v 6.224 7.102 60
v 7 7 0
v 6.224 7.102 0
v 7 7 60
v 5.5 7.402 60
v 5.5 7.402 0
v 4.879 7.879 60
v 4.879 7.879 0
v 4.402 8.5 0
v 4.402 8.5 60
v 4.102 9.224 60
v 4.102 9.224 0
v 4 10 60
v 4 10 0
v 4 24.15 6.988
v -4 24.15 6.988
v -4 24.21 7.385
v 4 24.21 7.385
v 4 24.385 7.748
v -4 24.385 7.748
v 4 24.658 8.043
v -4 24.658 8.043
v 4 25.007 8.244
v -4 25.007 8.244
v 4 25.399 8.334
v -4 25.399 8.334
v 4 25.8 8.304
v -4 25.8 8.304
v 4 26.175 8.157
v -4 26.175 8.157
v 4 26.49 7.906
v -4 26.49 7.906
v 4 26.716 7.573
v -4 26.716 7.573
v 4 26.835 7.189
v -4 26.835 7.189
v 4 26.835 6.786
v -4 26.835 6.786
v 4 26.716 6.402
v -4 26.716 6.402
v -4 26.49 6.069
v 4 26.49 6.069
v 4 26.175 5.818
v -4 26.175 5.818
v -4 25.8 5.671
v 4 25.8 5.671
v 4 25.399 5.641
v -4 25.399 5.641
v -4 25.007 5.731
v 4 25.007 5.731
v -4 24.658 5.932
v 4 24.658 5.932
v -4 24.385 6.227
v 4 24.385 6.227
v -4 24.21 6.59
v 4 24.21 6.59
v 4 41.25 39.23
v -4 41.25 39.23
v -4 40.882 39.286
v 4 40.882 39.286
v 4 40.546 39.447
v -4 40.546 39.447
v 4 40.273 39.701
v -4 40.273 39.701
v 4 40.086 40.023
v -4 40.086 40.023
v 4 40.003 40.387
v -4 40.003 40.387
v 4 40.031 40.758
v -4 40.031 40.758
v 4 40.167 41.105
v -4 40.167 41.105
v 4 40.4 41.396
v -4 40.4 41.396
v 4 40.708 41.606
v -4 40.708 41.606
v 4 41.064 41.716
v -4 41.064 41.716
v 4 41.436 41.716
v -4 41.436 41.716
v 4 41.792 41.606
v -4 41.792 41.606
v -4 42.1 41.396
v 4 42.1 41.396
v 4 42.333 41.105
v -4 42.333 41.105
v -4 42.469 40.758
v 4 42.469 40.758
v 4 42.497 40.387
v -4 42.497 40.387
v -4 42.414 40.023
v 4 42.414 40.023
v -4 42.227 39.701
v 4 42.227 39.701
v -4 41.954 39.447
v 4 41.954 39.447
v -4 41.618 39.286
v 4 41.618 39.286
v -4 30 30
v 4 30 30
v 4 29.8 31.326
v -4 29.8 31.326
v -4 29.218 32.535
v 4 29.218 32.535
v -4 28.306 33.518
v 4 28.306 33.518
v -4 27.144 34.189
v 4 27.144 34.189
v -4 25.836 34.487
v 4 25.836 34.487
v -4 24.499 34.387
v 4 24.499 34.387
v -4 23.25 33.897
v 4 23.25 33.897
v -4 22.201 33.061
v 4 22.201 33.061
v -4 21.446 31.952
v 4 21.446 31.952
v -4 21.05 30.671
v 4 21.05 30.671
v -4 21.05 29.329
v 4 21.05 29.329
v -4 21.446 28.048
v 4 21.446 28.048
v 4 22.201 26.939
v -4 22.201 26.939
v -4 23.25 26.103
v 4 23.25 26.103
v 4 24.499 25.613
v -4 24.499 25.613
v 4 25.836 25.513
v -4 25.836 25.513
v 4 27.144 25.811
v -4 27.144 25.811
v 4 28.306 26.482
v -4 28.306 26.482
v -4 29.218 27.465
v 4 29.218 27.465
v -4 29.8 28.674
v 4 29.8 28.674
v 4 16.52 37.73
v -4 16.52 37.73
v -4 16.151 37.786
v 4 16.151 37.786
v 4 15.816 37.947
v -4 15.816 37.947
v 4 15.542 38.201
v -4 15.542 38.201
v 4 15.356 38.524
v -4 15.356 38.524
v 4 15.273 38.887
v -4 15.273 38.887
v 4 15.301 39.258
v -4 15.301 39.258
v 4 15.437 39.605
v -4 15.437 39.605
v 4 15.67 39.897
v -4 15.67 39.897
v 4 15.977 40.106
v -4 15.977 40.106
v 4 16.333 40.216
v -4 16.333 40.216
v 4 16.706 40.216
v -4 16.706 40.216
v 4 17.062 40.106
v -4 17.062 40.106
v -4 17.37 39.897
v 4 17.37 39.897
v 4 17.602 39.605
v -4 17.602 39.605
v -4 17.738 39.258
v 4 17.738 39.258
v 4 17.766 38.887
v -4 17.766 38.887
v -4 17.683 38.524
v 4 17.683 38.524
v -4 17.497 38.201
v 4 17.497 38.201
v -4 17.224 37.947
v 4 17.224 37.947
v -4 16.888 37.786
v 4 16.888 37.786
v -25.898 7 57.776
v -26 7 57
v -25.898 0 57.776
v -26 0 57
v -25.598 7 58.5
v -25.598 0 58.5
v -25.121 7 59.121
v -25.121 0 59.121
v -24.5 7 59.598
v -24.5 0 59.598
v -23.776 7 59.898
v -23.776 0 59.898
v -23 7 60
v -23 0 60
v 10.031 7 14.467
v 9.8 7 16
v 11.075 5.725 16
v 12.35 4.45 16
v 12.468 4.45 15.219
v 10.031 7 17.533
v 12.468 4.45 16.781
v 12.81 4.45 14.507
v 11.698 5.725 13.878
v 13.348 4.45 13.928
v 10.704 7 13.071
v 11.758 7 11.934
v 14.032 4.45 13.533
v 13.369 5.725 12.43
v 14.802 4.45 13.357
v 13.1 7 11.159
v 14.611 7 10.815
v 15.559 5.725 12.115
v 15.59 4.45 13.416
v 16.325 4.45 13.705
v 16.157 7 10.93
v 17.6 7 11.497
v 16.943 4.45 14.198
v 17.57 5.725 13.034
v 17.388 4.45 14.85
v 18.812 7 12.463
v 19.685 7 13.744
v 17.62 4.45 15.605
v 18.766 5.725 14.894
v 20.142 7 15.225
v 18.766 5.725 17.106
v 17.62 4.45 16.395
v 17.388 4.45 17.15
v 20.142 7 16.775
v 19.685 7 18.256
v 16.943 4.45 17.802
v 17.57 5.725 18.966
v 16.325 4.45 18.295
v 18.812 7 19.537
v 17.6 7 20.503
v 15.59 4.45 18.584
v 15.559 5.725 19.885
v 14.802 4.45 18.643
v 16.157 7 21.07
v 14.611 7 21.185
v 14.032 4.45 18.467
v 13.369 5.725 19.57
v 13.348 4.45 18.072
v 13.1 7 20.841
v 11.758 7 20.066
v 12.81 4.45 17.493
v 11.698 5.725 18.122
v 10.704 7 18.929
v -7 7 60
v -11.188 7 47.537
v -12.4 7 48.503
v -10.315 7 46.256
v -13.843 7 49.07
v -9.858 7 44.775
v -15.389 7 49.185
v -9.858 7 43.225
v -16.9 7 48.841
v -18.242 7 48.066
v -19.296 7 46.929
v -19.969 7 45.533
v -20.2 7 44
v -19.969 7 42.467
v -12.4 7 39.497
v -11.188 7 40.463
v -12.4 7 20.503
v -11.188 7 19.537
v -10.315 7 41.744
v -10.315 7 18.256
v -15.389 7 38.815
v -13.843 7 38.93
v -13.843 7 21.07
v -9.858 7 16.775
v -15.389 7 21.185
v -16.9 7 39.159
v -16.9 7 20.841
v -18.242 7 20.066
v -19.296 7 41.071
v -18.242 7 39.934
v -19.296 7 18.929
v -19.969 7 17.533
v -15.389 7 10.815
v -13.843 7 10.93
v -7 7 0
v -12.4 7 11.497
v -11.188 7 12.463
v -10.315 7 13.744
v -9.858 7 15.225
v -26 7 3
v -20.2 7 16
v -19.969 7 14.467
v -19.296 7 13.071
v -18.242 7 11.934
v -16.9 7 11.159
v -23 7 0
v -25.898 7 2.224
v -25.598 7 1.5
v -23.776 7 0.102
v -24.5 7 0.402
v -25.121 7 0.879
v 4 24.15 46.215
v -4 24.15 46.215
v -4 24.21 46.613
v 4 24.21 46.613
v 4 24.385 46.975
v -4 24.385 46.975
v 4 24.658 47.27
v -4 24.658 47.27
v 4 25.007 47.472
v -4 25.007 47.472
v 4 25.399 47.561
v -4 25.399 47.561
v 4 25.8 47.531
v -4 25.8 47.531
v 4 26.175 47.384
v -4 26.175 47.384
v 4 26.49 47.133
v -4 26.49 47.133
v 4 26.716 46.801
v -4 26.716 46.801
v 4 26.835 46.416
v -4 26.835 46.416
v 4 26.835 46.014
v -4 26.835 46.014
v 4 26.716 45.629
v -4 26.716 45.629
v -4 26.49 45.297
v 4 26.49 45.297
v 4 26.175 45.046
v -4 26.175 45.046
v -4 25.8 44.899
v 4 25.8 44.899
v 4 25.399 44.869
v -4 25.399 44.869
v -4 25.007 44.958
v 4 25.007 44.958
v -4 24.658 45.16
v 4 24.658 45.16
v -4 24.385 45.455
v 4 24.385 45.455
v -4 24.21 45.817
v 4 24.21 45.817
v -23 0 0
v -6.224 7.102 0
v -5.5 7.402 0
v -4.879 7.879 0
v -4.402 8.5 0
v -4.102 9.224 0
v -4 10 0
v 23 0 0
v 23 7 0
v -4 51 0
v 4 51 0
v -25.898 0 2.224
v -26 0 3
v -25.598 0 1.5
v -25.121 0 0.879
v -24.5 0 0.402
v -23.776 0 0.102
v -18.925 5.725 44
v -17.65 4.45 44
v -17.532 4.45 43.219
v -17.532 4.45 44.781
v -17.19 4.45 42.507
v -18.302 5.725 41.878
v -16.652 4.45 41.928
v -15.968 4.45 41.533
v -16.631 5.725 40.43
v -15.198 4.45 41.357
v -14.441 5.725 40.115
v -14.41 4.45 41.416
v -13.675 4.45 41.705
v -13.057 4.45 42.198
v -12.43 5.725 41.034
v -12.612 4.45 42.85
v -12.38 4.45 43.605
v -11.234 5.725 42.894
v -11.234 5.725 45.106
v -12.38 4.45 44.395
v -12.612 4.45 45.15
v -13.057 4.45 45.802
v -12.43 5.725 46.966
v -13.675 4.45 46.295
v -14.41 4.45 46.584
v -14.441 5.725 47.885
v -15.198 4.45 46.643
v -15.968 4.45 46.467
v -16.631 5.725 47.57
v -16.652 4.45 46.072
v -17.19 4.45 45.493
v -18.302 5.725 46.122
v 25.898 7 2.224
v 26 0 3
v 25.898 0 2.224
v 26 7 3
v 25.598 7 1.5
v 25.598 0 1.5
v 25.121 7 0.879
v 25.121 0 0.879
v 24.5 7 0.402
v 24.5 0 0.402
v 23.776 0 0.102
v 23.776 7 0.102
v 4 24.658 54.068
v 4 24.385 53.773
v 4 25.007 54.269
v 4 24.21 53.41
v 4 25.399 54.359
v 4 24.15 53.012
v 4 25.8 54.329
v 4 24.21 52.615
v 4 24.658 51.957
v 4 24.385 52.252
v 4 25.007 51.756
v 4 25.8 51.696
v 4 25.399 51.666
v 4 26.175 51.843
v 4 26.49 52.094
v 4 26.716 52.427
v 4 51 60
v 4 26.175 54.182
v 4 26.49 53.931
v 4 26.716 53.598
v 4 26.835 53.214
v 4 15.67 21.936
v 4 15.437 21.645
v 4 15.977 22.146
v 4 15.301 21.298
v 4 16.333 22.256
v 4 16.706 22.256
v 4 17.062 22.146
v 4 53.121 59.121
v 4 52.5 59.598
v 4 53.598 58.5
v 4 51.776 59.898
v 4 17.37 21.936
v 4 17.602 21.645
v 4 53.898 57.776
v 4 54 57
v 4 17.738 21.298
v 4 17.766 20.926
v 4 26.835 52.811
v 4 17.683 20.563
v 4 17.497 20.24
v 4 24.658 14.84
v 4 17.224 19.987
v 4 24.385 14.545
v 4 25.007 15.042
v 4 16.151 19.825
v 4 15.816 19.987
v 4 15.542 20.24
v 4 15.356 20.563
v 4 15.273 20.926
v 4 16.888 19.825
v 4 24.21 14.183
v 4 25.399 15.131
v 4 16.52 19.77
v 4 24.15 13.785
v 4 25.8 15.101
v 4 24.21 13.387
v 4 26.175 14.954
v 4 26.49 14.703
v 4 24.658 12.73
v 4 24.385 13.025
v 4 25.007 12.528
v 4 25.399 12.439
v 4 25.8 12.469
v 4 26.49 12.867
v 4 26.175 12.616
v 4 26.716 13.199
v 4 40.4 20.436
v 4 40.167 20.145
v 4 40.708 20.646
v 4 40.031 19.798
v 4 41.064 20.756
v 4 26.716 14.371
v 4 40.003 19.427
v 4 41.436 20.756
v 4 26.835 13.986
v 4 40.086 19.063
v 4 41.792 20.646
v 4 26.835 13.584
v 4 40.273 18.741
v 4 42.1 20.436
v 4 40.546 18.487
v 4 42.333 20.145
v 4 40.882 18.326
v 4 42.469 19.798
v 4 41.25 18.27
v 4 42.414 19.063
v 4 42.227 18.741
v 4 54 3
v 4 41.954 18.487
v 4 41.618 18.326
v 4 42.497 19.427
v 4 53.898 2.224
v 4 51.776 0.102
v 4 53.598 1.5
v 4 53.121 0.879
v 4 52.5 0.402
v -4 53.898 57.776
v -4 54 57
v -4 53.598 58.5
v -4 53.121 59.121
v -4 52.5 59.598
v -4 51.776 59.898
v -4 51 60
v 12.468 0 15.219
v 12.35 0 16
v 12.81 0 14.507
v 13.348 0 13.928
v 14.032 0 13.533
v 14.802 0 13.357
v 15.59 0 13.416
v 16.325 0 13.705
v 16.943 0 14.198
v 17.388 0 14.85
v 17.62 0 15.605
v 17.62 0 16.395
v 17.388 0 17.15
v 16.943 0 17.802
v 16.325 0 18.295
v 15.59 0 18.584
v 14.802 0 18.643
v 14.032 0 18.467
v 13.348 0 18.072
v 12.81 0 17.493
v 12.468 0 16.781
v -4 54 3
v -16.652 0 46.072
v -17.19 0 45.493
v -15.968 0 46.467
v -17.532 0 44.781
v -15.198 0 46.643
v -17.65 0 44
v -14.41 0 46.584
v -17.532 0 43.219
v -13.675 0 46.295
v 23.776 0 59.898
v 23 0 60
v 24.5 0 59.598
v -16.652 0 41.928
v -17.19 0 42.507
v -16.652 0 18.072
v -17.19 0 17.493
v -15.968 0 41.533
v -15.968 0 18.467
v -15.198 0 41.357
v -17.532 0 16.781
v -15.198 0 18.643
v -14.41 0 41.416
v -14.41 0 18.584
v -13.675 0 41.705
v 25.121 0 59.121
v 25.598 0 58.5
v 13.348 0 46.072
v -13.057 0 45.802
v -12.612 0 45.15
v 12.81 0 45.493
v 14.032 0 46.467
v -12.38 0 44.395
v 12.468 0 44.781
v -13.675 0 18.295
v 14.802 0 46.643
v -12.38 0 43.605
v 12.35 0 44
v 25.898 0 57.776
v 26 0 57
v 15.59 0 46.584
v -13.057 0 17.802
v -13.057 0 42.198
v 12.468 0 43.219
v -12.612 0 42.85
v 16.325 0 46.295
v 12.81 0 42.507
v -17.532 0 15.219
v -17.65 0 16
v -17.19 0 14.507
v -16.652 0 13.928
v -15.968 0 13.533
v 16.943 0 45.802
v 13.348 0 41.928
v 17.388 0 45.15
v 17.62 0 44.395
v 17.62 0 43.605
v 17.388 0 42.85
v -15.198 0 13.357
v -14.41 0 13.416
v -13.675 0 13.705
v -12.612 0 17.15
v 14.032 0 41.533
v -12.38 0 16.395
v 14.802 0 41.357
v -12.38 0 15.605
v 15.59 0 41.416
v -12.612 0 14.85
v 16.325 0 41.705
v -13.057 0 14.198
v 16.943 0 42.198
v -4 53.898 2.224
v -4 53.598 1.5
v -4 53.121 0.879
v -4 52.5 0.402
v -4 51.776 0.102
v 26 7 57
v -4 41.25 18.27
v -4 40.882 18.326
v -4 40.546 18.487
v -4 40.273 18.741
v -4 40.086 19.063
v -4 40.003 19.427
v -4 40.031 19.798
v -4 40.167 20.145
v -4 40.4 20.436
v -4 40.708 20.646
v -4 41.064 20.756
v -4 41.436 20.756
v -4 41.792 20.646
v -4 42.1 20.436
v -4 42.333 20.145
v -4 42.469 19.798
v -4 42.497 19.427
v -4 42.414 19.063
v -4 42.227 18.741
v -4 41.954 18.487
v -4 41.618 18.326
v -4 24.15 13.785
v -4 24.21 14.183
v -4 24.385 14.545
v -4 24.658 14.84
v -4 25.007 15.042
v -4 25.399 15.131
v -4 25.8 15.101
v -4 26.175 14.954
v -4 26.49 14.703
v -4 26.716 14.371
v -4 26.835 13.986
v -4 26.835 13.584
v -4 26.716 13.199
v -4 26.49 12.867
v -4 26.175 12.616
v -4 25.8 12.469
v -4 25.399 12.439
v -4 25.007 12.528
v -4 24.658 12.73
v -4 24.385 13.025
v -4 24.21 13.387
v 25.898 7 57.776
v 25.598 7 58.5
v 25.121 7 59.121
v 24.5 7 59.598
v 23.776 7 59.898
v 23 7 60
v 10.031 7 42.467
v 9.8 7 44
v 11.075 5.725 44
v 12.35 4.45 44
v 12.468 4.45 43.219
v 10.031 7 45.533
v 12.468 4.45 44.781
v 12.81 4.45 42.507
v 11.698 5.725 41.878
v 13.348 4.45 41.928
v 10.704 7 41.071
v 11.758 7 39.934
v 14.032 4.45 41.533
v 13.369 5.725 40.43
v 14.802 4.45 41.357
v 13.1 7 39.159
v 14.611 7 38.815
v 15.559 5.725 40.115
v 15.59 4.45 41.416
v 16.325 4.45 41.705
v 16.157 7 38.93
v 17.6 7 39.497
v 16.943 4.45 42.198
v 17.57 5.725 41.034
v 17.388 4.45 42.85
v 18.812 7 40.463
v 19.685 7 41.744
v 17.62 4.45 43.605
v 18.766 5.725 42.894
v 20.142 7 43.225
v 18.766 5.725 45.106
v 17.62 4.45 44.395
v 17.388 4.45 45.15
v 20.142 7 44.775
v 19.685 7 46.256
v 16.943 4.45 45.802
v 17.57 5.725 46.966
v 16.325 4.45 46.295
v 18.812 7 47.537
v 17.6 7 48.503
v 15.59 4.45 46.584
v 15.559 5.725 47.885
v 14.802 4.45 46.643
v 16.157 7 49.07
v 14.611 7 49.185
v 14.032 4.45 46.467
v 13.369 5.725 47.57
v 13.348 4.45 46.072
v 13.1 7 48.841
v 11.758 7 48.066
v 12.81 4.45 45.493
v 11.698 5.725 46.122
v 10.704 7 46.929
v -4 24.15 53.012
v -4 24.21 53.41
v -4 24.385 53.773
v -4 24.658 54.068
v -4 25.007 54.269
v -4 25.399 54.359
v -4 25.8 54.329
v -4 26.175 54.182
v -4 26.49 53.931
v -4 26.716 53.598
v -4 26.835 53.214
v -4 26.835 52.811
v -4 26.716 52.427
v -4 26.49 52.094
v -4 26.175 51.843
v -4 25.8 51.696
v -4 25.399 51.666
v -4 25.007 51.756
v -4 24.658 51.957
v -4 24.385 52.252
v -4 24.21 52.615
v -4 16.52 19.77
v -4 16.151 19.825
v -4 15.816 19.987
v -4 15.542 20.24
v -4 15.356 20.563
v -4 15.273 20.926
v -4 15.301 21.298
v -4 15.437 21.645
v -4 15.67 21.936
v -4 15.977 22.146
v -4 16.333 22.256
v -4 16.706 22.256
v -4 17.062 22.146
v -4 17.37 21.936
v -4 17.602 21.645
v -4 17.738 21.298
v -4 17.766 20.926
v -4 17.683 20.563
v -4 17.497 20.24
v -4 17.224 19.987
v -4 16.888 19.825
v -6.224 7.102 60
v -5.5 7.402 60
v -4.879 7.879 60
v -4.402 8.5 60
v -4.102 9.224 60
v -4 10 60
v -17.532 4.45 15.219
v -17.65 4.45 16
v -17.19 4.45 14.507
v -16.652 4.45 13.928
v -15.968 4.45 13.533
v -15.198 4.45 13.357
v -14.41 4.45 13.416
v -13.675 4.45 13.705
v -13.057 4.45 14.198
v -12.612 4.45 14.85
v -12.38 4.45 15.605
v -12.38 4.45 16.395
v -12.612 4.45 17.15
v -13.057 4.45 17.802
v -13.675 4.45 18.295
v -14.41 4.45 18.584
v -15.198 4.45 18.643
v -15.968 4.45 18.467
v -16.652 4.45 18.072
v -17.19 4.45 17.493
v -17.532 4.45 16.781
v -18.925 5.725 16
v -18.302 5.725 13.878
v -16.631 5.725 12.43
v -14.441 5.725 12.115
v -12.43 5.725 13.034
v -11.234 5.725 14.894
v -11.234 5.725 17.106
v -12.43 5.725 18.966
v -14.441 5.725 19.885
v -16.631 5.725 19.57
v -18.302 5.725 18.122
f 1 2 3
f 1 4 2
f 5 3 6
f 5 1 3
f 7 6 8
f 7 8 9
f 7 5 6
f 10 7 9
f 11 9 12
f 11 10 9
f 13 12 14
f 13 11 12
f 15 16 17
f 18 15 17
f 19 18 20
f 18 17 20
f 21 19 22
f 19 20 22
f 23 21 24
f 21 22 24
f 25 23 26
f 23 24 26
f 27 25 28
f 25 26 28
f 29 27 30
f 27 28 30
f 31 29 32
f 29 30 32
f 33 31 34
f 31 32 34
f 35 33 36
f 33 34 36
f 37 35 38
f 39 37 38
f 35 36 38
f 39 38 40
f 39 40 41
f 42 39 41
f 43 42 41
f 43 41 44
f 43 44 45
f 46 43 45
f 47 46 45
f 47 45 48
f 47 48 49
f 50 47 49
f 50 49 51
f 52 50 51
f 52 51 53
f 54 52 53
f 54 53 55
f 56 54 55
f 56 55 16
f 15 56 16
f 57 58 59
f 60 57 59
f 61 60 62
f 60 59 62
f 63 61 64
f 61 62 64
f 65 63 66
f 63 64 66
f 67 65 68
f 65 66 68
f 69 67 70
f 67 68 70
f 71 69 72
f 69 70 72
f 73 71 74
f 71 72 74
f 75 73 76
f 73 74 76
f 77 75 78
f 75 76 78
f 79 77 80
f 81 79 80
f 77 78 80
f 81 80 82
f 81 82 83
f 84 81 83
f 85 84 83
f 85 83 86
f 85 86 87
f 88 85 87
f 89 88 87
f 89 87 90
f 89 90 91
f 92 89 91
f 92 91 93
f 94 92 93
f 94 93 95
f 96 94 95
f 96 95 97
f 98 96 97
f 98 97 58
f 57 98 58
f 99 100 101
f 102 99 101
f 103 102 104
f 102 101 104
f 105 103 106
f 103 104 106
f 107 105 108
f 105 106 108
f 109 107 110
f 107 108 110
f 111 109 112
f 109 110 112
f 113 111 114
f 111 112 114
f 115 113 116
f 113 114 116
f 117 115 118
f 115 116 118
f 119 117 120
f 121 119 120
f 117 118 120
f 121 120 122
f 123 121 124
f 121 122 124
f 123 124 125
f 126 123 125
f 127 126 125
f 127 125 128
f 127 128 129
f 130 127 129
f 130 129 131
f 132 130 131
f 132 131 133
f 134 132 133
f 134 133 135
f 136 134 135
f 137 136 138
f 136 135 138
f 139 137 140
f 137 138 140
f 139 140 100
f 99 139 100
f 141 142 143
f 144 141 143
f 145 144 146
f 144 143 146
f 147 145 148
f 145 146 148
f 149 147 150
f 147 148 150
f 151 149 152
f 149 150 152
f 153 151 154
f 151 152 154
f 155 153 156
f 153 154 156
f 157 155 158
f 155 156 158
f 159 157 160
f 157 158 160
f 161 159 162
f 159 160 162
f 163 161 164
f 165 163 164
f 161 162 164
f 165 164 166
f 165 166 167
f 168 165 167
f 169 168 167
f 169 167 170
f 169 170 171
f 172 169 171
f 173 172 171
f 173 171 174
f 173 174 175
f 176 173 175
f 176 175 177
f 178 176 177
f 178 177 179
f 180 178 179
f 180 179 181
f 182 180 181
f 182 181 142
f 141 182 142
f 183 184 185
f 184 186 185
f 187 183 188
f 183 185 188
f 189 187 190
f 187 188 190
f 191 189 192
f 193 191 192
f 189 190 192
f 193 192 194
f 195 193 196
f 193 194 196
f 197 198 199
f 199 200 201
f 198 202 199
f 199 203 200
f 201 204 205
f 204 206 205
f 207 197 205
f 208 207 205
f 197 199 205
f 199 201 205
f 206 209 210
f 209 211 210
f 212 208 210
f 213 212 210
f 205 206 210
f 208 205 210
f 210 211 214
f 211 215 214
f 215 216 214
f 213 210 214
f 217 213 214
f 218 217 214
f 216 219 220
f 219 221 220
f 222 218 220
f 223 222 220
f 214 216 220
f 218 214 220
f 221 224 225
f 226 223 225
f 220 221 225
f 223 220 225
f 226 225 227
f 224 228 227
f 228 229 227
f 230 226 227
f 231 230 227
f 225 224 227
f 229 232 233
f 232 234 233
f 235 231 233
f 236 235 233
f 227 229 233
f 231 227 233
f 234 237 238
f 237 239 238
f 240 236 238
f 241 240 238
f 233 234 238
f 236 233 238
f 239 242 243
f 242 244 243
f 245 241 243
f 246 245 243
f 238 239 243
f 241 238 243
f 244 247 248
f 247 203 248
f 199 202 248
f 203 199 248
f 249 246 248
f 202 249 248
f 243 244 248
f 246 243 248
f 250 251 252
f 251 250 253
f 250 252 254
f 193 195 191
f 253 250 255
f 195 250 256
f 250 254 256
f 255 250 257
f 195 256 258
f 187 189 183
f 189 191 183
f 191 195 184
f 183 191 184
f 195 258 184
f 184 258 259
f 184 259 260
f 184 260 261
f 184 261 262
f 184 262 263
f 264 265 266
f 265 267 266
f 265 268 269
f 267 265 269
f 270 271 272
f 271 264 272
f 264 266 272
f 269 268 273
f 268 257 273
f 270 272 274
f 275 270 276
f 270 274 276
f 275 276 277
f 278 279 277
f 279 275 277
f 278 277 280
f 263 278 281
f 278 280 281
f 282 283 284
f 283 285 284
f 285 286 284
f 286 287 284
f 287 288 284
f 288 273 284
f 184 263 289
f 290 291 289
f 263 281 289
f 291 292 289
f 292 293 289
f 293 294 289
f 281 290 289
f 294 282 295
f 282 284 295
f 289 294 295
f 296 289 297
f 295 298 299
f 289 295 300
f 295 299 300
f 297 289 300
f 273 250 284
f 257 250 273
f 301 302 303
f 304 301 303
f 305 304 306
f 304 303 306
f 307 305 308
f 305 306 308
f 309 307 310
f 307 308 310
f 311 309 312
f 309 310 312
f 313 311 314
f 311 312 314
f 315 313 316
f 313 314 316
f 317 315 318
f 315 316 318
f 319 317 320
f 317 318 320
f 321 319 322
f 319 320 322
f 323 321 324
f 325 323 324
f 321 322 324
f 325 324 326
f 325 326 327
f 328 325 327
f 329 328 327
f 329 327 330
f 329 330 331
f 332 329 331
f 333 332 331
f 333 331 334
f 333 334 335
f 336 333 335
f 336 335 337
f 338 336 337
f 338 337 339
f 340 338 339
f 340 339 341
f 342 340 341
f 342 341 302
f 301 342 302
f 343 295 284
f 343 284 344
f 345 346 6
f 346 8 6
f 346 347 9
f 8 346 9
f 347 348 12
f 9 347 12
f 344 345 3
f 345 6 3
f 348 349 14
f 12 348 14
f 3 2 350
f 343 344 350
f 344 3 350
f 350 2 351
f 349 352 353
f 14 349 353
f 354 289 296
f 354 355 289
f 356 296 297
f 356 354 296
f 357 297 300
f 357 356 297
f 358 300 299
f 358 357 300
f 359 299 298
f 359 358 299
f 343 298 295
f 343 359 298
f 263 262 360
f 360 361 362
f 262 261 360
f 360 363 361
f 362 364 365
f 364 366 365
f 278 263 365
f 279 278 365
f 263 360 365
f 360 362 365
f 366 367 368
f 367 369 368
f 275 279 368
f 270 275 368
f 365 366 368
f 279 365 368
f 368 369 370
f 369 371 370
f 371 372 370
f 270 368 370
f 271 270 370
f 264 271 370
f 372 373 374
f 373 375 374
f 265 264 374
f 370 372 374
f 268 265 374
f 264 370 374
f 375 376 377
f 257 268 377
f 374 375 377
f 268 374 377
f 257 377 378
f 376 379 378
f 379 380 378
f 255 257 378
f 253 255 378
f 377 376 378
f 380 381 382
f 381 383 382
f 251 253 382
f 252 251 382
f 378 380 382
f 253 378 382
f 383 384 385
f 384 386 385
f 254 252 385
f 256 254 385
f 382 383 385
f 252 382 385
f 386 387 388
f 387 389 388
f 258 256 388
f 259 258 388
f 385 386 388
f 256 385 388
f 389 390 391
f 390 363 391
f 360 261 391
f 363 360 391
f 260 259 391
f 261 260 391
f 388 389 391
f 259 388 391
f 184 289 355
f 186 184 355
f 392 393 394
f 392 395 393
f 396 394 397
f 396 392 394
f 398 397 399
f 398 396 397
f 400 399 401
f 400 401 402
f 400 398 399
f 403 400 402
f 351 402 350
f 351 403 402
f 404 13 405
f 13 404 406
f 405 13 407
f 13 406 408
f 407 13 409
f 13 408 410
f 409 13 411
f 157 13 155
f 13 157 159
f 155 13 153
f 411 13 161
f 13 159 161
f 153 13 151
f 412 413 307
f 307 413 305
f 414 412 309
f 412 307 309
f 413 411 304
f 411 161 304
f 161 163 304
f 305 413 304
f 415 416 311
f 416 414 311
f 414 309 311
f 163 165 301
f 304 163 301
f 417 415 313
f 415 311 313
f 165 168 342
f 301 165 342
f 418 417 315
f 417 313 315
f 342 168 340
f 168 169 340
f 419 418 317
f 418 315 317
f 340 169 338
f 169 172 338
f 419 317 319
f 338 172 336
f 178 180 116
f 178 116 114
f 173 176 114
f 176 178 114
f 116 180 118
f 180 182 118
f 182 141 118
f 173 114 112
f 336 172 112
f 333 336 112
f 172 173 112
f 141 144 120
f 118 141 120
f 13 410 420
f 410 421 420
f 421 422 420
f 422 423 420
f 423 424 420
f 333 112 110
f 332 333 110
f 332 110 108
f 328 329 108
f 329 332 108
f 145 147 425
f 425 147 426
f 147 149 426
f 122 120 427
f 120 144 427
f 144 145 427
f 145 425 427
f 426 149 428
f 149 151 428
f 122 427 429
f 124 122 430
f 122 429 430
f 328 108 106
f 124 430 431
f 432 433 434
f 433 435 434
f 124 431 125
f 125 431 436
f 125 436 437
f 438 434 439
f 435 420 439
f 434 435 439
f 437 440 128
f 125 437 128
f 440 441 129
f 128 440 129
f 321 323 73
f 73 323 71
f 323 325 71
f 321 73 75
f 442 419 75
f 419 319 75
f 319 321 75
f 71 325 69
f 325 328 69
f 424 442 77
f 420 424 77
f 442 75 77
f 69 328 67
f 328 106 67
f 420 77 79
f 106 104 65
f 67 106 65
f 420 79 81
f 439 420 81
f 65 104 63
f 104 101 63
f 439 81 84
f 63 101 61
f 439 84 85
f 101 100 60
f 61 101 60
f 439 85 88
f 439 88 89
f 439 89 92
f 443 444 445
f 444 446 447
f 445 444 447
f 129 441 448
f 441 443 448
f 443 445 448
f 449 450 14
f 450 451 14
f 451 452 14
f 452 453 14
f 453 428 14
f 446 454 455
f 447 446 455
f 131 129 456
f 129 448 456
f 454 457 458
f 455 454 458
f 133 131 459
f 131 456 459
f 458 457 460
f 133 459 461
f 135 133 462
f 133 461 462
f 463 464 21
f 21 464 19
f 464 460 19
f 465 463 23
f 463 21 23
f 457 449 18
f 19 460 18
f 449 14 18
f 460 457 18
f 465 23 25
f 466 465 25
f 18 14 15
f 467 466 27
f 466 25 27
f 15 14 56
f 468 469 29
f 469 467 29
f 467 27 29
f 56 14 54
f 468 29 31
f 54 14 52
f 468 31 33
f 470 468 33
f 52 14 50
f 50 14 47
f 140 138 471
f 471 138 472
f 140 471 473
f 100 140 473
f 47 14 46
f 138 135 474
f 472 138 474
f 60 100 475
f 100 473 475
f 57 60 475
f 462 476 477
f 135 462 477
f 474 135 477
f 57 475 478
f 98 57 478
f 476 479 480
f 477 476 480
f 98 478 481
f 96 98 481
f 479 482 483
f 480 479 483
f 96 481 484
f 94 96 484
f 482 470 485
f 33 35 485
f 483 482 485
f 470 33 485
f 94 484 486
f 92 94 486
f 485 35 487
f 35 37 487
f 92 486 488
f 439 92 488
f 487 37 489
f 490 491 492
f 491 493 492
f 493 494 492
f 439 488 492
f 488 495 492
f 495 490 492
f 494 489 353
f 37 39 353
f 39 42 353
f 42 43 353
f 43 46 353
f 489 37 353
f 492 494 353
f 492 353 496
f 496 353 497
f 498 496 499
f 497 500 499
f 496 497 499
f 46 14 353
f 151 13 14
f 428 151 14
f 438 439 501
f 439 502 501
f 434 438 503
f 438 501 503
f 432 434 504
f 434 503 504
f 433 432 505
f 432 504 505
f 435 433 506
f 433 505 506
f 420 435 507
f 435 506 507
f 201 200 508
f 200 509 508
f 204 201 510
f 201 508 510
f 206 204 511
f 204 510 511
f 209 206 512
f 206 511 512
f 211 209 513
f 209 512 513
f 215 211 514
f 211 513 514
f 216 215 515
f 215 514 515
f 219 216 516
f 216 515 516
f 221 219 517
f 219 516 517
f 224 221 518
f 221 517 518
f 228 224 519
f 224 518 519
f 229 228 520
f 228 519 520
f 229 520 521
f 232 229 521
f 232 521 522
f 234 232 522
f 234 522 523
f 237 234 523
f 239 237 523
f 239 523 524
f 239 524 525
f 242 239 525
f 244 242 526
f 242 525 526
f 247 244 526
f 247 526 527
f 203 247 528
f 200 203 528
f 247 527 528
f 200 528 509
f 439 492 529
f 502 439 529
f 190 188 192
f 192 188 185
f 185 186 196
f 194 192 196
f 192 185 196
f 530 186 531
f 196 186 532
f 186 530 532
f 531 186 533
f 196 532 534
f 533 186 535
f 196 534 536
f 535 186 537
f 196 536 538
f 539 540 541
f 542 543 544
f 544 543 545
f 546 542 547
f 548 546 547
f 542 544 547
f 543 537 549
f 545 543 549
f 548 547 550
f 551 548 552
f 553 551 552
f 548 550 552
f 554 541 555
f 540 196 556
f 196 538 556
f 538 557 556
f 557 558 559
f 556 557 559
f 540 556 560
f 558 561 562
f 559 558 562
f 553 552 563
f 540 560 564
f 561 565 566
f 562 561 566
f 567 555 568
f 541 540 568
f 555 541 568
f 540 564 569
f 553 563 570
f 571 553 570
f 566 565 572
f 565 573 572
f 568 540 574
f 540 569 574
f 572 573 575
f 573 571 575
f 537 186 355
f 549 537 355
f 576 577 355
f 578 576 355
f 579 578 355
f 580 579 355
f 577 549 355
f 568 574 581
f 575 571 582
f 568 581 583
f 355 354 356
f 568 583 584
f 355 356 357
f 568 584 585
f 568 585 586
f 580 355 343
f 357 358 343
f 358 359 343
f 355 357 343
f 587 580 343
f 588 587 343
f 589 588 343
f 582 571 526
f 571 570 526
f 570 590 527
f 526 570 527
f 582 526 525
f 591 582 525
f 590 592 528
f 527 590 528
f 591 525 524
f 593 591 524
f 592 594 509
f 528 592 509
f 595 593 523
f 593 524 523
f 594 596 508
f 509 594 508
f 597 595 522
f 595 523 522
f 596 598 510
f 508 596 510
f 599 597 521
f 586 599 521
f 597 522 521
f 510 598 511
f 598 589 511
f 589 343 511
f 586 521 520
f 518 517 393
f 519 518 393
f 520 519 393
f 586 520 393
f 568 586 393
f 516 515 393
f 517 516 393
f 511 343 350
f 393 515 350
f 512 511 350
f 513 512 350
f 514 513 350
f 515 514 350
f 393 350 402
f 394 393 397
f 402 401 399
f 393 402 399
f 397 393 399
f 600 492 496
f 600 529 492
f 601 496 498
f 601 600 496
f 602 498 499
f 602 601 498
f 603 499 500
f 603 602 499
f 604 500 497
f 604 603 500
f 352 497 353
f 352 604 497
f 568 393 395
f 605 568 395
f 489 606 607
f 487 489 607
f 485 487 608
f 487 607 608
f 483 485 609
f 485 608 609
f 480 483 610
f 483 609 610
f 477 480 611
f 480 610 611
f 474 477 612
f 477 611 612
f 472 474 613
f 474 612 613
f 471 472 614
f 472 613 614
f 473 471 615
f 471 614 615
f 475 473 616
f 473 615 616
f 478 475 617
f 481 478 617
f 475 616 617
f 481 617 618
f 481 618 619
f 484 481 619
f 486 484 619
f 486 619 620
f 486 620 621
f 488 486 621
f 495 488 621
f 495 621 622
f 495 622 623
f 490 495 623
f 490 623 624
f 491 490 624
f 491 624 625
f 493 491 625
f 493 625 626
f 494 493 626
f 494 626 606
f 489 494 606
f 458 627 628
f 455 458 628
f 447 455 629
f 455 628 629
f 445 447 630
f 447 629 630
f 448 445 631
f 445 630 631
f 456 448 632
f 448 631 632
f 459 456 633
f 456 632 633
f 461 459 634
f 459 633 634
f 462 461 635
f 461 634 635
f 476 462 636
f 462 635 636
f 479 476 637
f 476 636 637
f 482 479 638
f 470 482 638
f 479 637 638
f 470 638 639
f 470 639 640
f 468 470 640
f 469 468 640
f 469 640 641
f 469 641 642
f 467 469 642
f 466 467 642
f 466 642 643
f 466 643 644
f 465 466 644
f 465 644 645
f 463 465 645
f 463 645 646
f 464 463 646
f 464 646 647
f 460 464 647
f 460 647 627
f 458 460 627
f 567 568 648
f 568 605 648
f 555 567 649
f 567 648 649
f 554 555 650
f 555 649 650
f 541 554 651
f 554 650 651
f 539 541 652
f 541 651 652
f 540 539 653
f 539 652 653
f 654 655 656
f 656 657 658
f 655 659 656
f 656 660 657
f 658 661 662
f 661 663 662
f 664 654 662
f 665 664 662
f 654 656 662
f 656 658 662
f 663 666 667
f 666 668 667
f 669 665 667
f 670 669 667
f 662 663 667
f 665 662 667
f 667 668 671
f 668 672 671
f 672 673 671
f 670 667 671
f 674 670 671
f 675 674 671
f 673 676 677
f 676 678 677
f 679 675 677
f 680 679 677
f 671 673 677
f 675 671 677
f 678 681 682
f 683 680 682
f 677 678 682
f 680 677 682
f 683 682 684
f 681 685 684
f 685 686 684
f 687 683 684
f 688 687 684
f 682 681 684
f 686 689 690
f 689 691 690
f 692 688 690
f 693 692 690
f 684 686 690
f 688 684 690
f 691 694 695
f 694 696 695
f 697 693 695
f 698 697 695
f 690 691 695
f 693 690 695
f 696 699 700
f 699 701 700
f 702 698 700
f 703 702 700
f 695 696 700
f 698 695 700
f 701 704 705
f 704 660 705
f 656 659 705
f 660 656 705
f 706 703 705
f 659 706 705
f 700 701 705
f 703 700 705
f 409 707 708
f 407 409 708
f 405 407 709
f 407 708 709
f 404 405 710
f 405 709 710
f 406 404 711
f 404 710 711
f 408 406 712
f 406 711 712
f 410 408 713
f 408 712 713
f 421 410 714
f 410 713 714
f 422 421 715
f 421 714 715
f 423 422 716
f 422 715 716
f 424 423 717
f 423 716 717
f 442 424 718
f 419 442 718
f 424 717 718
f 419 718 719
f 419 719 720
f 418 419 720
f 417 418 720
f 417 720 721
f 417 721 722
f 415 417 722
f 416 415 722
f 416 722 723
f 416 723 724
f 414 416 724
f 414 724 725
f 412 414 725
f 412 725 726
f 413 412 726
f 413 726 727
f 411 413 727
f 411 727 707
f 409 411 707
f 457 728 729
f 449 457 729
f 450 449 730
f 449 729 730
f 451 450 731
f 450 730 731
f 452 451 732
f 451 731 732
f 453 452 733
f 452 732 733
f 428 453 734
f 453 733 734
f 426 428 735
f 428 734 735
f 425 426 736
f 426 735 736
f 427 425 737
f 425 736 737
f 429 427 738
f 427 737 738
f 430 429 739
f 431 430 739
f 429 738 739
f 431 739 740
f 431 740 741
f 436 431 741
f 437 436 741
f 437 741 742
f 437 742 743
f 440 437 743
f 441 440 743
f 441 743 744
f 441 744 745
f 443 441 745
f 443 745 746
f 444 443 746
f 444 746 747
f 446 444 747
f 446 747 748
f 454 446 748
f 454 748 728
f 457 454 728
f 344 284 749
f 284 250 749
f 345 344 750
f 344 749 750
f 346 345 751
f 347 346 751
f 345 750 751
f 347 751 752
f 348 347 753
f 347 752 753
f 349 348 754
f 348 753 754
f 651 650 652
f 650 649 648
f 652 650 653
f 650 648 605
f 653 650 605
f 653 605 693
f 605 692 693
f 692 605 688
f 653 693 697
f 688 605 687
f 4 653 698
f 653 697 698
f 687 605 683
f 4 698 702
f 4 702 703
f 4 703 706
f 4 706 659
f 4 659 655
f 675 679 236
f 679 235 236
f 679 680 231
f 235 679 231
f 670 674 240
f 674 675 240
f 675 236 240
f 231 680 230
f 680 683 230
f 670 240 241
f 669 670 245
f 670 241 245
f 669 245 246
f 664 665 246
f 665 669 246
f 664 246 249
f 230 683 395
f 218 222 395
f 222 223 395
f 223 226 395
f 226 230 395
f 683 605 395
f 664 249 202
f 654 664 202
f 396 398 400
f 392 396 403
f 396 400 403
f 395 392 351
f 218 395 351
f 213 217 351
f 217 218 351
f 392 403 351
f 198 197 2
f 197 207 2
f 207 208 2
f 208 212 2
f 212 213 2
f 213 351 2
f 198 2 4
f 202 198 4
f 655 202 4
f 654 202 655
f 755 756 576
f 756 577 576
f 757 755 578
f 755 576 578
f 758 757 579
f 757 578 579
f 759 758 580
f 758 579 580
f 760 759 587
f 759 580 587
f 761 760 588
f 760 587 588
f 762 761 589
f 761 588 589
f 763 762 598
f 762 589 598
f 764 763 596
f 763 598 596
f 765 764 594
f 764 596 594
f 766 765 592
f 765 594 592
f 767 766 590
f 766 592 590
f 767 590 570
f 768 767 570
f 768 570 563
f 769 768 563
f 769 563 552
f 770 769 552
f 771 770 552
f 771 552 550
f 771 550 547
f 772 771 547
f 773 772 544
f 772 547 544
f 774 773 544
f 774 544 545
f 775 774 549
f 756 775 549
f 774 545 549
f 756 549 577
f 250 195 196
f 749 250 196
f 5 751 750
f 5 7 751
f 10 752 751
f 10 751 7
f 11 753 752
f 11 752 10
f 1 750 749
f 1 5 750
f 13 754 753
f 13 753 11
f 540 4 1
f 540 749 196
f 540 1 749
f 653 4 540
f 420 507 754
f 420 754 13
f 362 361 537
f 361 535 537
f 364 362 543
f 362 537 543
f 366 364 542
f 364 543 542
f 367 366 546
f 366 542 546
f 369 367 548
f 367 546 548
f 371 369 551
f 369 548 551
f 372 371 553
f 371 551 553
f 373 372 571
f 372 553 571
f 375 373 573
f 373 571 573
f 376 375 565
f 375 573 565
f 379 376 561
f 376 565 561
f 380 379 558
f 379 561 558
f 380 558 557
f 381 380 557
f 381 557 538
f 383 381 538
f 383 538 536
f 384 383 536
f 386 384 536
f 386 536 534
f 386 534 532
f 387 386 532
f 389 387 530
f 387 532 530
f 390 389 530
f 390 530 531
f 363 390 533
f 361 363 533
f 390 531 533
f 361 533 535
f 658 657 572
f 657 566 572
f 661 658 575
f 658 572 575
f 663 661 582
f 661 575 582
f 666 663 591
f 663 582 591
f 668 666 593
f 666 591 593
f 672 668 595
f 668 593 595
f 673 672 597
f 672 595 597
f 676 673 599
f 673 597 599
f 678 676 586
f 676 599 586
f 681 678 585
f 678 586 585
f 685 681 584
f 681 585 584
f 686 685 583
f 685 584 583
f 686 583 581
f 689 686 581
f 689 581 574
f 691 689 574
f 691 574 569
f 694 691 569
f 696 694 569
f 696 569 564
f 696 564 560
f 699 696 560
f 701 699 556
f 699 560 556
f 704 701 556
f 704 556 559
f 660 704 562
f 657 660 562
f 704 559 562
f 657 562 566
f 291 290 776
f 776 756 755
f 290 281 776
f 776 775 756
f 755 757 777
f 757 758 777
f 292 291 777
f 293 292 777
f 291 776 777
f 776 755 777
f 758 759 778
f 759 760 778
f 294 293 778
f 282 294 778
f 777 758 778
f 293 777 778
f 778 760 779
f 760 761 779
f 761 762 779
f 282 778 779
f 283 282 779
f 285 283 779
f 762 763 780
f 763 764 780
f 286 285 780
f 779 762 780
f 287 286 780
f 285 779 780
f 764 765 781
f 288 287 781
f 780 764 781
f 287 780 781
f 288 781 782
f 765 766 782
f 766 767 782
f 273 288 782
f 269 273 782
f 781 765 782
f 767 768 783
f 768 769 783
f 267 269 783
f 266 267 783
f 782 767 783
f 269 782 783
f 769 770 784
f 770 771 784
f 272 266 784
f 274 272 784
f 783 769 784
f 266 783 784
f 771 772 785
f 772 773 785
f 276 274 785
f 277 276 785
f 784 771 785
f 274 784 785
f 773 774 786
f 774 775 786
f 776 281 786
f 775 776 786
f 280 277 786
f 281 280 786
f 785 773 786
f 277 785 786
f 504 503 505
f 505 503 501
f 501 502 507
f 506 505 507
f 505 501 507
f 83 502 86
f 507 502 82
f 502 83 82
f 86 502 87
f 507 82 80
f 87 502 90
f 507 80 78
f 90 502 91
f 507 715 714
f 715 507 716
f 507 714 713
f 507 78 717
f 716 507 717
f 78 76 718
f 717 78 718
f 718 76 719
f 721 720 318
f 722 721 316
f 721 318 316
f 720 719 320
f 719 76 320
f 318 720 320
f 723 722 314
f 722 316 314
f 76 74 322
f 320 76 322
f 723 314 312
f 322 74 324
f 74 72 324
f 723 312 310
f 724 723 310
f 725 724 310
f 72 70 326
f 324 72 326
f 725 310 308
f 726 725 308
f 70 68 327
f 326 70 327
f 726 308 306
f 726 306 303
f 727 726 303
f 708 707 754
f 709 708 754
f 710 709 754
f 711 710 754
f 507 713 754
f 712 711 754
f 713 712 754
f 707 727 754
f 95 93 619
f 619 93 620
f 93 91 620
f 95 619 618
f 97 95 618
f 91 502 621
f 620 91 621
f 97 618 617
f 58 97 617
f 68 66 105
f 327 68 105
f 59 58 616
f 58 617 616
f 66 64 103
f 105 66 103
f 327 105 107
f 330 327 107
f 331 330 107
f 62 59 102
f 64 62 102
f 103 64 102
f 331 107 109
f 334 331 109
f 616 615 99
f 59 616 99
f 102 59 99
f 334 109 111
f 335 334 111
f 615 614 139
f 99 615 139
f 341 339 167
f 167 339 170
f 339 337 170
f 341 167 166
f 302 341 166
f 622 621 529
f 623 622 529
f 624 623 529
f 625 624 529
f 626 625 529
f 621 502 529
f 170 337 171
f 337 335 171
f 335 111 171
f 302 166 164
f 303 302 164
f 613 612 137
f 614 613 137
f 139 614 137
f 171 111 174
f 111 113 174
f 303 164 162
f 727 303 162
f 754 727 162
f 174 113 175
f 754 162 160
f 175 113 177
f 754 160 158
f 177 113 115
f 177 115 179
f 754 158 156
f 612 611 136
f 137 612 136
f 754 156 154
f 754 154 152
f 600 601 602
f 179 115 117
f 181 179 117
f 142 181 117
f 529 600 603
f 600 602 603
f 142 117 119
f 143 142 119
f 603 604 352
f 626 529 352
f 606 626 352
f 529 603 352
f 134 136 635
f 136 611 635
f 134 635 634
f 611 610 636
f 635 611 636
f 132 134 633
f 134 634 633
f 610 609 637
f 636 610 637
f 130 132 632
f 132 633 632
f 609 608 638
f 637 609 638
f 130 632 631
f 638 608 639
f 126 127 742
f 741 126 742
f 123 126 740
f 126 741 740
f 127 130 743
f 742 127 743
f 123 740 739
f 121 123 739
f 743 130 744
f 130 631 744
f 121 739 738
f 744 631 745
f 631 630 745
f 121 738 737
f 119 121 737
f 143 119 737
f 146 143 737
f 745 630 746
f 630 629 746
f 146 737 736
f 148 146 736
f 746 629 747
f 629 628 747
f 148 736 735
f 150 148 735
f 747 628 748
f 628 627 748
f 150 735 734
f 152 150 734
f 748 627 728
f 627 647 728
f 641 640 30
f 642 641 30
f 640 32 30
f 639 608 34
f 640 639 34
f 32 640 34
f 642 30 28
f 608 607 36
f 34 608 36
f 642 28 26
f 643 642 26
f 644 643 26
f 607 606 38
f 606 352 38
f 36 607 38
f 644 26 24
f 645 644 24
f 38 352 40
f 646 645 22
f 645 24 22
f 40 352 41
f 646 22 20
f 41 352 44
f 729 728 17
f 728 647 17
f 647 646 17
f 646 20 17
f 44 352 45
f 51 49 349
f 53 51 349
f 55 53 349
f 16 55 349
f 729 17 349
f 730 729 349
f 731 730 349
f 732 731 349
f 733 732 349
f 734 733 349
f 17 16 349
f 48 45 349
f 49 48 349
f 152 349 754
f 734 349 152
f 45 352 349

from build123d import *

# Parameters (mm, degrees)
BOSS_EXTRUDE1_DEPTH                                  = 60
FILLET1_R                                            = 3
SKETCH2_R                                            = 4.5
CUT_EXTRUDE1_DEPTH                                   = 8
TAP_DRILL_FOR_M3_TAP1_D                              = 2.7
TAP_DRILL_FOR_M3_TAP2_D                              = 2.5
CSK_FOR_M5_COUNTERSUNK_RAISED_HEAD_SCREW_D           = 5.3
CSK_FOR_M5_COUNTERSUNK_RAISED_HEAD_SCREW_CSINK_D     = 10.4
CSK_FOR_M5_COUNTERSUNK_RAISED_HEAD_SCREW_CSINK_ANGLE = 90


with BuildPart() as part:
    # Sketch1 → Boss-Extrude1 (new body)
    with BuildSketch(Plane.XY):
        Polygon((-4, 7), (-26, 7), (-26, 0), (26, 0), (26, 7), (4, 7), (4, 54), (-4, 54), align=None)
    extrude(amount=BOSS_EXTRUDE1_DEPTH)

    # Fillet1
    fillet1_edges = [part.edges().sort_by_distance(p)[0] for p in [
        (0, 54, 0),
        (26, 3.5, 0),
        (-26, 3.5, 0),
        (26, 3.5, 60),
        (-4, 7, 30),
        (4, 7, 30),
        (0, 54, 60),
        (-26, 3.5, 60),
    ]]
    fillet(fillet1_edges, radius=FILLET1_R)

    # Sketch2 → Cut-Extrude1 (cut)
    with BuildSketch(Plane(origin=(4, 0, 0), x_dir=(0, 0, -1), z_dir=(1, 0, 0))):
        with Locations(Location((-30, 25.5, 0), (0, 0, 90))):
            Circle(SKETCH2_R)
    extrude(amount=-CUT_EXTRUDE1_DEPTH, mode=Mode.SUBTRACT)

    # Tap Drill for M3 Tap1 (through all)
    with Locations(Plane(origin=(4, 25.5, 46.215), x_dir=(0, 1, 0), z_dir=(1, 0, 0))):
        with Locations((0, 0), (0, -32.43), (0, 6.7975), (0, -39.2275)):
            Hole(TAP_DRILL_FOR_M3_TAP1_D / 2)

    # Tap Drill for M3 Tap2 (through all)
    with Locations(Plane(origin=(4, 41.25, 40.48), x_dir=(0, 0, 1), z_dir=(1, 0, 0))):
        with Locations((0, 0), (-20.96, 0), (-19.460256121, 24.730256121), (-1.499743879, 24.730256121)):
            Hole(TAP_DRILL_FOR_M3_TAP2_D / 2)

    # CSK for M5 Countersunk Raised Head Screw1 (through all)
    with Locations(Plane(origin=(-15, 7, 16), x_dir=(1, 0, 0), z_dir=(0, 1, 0))):
        with Locations((0, 0), (0, -28), (30, -28), (30, 0)):
            CounterSinkHole(CSK_FOR_M5_COUNTERSUNK_RAISED_HEAD_SCREW_D / 2, CSK_FOR_M5_COUNTERSUNK_RAISED_HEAD_SCREW_CSINK_D / 2, counter_sink_angle=CSK_FOR_M5_COUNTERSUNK_RAISED_HEAD_SCREW_CSINK_ANGLE)


solid = part.part
